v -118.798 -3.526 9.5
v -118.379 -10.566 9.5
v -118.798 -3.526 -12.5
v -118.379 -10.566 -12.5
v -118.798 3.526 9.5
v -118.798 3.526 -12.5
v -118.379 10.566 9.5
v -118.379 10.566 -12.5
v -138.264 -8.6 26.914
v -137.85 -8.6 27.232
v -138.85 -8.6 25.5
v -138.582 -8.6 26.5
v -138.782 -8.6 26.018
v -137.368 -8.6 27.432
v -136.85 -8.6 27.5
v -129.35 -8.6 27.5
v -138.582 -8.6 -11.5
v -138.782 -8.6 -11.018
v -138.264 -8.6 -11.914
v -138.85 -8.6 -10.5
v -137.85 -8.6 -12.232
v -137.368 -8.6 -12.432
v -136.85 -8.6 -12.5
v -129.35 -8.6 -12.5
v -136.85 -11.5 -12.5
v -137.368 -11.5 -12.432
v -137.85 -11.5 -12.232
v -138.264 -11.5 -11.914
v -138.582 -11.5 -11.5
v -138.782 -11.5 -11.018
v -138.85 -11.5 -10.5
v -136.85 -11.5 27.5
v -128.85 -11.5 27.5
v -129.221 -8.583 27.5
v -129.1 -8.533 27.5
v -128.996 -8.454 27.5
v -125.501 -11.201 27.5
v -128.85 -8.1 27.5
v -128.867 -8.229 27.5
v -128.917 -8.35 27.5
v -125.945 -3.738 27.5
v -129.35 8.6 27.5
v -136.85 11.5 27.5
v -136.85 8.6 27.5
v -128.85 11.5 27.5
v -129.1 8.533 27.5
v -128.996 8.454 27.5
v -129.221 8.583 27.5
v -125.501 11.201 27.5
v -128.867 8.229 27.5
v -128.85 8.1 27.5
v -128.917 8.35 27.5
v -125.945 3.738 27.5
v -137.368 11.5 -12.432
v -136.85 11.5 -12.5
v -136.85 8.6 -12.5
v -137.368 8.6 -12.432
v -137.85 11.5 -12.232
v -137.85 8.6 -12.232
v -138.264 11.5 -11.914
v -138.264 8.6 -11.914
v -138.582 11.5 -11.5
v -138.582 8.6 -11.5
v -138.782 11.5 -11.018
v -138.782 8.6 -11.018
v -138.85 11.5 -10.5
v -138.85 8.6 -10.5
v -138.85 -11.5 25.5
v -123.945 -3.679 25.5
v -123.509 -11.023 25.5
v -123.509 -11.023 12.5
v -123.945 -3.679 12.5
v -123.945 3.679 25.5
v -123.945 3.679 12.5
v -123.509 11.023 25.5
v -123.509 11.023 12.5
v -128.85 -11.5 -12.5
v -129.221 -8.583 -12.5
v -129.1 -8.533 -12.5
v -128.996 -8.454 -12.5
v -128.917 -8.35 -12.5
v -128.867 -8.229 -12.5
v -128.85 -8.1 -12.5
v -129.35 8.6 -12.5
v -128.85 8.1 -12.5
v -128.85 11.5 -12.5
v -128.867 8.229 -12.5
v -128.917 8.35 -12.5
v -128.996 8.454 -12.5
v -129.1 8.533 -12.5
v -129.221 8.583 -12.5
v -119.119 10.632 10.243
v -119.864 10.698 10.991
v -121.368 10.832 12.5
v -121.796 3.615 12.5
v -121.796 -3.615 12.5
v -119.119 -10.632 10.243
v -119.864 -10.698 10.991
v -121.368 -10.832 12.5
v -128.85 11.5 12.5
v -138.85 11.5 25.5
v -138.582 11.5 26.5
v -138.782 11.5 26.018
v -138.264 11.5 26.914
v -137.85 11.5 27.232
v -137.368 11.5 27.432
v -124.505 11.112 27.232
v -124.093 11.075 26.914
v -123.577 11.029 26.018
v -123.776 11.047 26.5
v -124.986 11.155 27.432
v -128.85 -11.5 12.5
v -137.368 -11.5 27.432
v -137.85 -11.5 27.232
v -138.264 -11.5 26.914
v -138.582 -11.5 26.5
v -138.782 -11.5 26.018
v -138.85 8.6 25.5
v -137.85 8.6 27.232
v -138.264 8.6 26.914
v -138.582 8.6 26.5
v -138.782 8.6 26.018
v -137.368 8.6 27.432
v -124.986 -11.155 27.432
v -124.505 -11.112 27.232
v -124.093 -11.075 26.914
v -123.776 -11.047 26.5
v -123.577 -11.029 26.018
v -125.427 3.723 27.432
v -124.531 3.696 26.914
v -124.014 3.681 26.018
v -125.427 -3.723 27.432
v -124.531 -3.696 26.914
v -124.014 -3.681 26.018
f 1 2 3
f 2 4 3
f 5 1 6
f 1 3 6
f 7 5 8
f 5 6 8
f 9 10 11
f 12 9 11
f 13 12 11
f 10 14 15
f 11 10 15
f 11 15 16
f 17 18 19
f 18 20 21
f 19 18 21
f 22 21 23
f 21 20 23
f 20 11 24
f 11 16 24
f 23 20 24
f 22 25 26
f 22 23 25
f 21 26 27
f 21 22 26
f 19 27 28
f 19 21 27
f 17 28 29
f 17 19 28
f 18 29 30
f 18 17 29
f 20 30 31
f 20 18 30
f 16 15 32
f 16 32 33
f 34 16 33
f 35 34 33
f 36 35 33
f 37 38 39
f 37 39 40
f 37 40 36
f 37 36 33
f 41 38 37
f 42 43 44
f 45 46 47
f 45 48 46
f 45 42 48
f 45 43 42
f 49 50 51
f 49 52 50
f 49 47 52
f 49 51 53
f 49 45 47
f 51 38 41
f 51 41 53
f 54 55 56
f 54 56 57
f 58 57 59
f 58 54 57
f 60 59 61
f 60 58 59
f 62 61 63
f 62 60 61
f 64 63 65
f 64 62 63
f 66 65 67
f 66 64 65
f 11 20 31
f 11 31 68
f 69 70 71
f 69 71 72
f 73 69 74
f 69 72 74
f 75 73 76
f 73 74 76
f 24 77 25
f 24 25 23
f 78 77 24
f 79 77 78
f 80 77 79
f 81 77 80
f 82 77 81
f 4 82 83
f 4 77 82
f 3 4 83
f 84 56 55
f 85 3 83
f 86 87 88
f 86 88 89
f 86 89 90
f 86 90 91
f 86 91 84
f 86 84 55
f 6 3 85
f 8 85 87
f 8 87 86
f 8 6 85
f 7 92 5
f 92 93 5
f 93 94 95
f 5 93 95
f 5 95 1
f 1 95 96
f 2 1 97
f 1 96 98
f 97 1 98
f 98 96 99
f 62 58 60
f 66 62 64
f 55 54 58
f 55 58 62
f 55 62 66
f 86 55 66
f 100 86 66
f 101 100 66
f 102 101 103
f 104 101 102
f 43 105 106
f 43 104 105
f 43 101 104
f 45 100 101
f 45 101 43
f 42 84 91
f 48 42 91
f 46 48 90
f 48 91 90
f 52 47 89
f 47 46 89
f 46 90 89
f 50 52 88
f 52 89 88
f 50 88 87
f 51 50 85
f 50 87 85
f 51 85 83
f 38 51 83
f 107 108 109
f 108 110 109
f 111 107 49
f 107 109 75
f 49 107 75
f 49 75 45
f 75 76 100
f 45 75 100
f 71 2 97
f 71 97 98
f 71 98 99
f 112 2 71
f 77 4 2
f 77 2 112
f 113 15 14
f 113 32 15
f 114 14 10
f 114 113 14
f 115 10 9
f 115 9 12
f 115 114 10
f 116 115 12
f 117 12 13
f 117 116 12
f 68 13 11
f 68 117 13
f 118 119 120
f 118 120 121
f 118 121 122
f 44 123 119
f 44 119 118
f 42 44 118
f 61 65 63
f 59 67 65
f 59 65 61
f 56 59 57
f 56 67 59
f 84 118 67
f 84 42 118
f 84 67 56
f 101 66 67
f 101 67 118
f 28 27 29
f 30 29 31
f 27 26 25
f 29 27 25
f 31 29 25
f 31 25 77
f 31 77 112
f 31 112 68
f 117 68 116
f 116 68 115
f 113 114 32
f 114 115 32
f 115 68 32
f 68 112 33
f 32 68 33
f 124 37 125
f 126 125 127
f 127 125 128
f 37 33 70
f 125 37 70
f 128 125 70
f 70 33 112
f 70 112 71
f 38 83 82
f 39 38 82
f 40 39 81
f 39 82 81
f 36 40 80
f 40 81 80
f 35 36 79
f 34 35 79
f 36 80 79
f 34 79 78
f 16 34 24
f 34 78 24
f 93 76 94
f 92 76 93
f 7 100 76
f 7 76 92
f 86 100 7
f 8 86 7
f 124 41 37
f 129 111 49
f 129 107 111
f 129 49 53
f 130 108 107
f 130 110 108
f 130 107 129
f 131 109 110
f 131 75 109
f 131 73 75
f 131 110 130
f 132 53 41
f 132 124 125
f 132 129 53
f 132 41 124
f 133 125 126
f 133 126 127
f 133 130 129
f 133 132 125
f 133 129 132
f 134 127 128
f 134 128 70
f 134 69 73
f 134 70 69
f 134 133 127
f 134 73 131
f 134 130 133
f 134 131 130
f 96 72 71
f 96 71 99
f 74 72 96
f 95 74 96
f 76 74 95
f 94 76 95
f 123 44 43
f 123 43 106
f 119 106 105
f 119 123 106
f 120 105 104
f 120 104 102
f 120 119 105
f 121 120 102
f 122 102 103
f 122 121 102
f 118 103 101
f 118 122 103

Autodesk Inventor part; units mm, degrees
ref_plane "YZ Plane" through (0, 0, 0) normal (1, 0, 0) x (0, 1, 0)
ref_plane "XZ Plane" through (0, 0, 0) normal (0, 1, 0) x (-1, 0, 0)
ref_plane "XY Plane" through (0, 0, 0) normal (0, 0, 1) x (1, 0, 0)
sketch "Sketch1" plane through (0, 0, 0) normal (0, 0, 1) x (1, 0, 0)
  arc A0 (-118.3794, 10.5655) -> (-118.3794, -10.5655) centre (0, 0) ccw
  line L0 (0, 0) -> (-118.85, 0) construction
  line L1 (0, 0) -> (-118.3794, -10.5655) construction
  line L2 (-118.3794, -10.5655) -> (-118.3794, 0) construction
  line L3 (-128.85, 11.5) -> (-118.3794, 10.5655)
  line L4 (-118.3794, 0) -> (-118.3794, 10.5655) construction
  arc A1 (-128.85, 11.5) -> (-128.85, -11.5) centre (0, 0) ccw construction
  line L5 (-118.3794, 10.5655) -> (0, 0) construction
  line L6 (-118.3794, -10.5655) -> (-128.85, -11.5)
  arc A2 (-118.3794, -10.5655) -> (-118.3794, 10.5655) centre (0, 0) ccw construction
  arc A3 (-128.85, -11.5) -> (-128.85, 11.5) centre (0, 0) ccw construction
  line L7 (-128.85, 11.5) -> (-128.85, -11.5)
  dimension "d0" = 237.7
  dimension "d33" = 23
  dimension "d34" = 128.85
  dimension "d37" = 10
extrude "Extrusion1" add sketch "Sketch1" along normal mid plane 25
chamfer "Chamfer1" distance 3 angle 45 1 edges at (-118.85, 0, 12.5)
sketch "Sketch4" plane through (0, 0, 0) normal (0, 0, 1) x (1, 0, 0)
  line L0 (0, 0) -> (-126.7631, 7.7532) construction
  line L1 (0, 0) -> (-127, 0) construction
  line L2 (0, 0) -> (-126.7631, -7.7532) construction
  arc A0 (-128.85, 11.5) -> (-128.85, -11.5) centre (0, 0) ccw projected
  arc A1 (-121.3676, 10.8322) -> (-121.3676, -10.8322) centre (0, 0) ccw projected
  line L3 (-121.3676, 10.8322) -> (-128.85, 11.5) projected
  line L4 (-128.85, -11.5) -> (-121.3676, -10.8322) projected
  circle A2 centre (0, 0) radius 127 construction
  line L5 (-128.85, 11.5) -> (-128.85, -11.5) projected
  dimension "d25" = 3.5
  dimension "d26" = 3.5
sketch "Sketch7" plane through (0, 0, 12.5) normal (0, 0, 1) x (1, 0, 0)
  arc A0 (-121.3676, 10.8322) -> (-121.3676, -10.8322) centre (0, 0) ccw projected
  line L0 (-121.3676, 10.8322) -> (-128.85, 11.5) projected
  line L1 (-128.85, 11.5) -> (-128.85, -11.5) projected
  line L2 (-128.85, -11.5) -> (-121.3676, -10.8322) projected
  arc A1 (-123.5091, 11.0233) -> (-123.5091, -11.0233) centre (0, 0) ccw
  arc A2 (-123.5091, -11.0233) -> (-123.5091, 11.0233) centre (0, 0) ccw construction
  line L3 (-128.85, 11.5) -> (-123.5091, 11.0233)
  line L4 (-128.85, -11.5) -> (-123.5091, -11.0233)
  line L5 (-128.85, 11.4972) -> (-128.85, -11.5)
  dimension "d44" = 248
extrude "Extrusion8" add sketch "Sketch7" along normal blind 15 contours A1 L2 L1 L0
sketch "Sketch8" plane through (-128.85, -11.5, -12.5) normal (-1, 0, 0) x (0, 0, 1)
  line L0 (0, 0) -> (0, 23) projected
  line L1 (40, 23) -> (40, 0) projected
  line L2 (0, 23) -> (40, 23)
  line L3 (40, 23) -> (40, 20.1)
  line L4 (40, 20.1) -> (0, 20.1)
  line L5 (0, 20.1) -> (0, 23)
  line L6 (0, 0) -> (40, 0)
  line L7 (40, 0) -> (40, 2.9)
  line L8 (40, 2.9) -> (0, 2.9)
  line L9 (0, 2.9) -> (0, 0)
  dimension "d48" = 2.9
  dimension "d49" = 2.9
extrude "Extrusion7" add sketch "Sketch8" along normal blind 10 contours L0 L8 L1 L6 | L0 L2 L1 L4
fillet "Fillet3" radius 0.5 2 edges at (-128.85, 8.6, 7.5) (-128.85, -8.6, 7.5)
fillet "Fillet4" radius 2 5 edges at (-138.85, 10.05, 27.5) (-138.85, -10.05, 27.5) (-138.85, 10.05, -12.5) (-138.85, -10.05, -12.5) (-124, 0, 27.5)
equation "\"d26\" = d25"
equation "\"d44\" = diametro_max_soporte"
equation "\"d49\" = d48"
equation "\"angulo_alabe\" = 130deg"
equation "\"diametro_tubo\" = 232"
equation "\"desfase_a_pin_superior\" = 12"
equation "\"desfase_b_pin_inferior\" = 8"
equation "\"desfase_b_pin_superior\" = 0"
equation "\"diametro_max_soporte\" = 248"
properties part number "accesorios separador 1"
